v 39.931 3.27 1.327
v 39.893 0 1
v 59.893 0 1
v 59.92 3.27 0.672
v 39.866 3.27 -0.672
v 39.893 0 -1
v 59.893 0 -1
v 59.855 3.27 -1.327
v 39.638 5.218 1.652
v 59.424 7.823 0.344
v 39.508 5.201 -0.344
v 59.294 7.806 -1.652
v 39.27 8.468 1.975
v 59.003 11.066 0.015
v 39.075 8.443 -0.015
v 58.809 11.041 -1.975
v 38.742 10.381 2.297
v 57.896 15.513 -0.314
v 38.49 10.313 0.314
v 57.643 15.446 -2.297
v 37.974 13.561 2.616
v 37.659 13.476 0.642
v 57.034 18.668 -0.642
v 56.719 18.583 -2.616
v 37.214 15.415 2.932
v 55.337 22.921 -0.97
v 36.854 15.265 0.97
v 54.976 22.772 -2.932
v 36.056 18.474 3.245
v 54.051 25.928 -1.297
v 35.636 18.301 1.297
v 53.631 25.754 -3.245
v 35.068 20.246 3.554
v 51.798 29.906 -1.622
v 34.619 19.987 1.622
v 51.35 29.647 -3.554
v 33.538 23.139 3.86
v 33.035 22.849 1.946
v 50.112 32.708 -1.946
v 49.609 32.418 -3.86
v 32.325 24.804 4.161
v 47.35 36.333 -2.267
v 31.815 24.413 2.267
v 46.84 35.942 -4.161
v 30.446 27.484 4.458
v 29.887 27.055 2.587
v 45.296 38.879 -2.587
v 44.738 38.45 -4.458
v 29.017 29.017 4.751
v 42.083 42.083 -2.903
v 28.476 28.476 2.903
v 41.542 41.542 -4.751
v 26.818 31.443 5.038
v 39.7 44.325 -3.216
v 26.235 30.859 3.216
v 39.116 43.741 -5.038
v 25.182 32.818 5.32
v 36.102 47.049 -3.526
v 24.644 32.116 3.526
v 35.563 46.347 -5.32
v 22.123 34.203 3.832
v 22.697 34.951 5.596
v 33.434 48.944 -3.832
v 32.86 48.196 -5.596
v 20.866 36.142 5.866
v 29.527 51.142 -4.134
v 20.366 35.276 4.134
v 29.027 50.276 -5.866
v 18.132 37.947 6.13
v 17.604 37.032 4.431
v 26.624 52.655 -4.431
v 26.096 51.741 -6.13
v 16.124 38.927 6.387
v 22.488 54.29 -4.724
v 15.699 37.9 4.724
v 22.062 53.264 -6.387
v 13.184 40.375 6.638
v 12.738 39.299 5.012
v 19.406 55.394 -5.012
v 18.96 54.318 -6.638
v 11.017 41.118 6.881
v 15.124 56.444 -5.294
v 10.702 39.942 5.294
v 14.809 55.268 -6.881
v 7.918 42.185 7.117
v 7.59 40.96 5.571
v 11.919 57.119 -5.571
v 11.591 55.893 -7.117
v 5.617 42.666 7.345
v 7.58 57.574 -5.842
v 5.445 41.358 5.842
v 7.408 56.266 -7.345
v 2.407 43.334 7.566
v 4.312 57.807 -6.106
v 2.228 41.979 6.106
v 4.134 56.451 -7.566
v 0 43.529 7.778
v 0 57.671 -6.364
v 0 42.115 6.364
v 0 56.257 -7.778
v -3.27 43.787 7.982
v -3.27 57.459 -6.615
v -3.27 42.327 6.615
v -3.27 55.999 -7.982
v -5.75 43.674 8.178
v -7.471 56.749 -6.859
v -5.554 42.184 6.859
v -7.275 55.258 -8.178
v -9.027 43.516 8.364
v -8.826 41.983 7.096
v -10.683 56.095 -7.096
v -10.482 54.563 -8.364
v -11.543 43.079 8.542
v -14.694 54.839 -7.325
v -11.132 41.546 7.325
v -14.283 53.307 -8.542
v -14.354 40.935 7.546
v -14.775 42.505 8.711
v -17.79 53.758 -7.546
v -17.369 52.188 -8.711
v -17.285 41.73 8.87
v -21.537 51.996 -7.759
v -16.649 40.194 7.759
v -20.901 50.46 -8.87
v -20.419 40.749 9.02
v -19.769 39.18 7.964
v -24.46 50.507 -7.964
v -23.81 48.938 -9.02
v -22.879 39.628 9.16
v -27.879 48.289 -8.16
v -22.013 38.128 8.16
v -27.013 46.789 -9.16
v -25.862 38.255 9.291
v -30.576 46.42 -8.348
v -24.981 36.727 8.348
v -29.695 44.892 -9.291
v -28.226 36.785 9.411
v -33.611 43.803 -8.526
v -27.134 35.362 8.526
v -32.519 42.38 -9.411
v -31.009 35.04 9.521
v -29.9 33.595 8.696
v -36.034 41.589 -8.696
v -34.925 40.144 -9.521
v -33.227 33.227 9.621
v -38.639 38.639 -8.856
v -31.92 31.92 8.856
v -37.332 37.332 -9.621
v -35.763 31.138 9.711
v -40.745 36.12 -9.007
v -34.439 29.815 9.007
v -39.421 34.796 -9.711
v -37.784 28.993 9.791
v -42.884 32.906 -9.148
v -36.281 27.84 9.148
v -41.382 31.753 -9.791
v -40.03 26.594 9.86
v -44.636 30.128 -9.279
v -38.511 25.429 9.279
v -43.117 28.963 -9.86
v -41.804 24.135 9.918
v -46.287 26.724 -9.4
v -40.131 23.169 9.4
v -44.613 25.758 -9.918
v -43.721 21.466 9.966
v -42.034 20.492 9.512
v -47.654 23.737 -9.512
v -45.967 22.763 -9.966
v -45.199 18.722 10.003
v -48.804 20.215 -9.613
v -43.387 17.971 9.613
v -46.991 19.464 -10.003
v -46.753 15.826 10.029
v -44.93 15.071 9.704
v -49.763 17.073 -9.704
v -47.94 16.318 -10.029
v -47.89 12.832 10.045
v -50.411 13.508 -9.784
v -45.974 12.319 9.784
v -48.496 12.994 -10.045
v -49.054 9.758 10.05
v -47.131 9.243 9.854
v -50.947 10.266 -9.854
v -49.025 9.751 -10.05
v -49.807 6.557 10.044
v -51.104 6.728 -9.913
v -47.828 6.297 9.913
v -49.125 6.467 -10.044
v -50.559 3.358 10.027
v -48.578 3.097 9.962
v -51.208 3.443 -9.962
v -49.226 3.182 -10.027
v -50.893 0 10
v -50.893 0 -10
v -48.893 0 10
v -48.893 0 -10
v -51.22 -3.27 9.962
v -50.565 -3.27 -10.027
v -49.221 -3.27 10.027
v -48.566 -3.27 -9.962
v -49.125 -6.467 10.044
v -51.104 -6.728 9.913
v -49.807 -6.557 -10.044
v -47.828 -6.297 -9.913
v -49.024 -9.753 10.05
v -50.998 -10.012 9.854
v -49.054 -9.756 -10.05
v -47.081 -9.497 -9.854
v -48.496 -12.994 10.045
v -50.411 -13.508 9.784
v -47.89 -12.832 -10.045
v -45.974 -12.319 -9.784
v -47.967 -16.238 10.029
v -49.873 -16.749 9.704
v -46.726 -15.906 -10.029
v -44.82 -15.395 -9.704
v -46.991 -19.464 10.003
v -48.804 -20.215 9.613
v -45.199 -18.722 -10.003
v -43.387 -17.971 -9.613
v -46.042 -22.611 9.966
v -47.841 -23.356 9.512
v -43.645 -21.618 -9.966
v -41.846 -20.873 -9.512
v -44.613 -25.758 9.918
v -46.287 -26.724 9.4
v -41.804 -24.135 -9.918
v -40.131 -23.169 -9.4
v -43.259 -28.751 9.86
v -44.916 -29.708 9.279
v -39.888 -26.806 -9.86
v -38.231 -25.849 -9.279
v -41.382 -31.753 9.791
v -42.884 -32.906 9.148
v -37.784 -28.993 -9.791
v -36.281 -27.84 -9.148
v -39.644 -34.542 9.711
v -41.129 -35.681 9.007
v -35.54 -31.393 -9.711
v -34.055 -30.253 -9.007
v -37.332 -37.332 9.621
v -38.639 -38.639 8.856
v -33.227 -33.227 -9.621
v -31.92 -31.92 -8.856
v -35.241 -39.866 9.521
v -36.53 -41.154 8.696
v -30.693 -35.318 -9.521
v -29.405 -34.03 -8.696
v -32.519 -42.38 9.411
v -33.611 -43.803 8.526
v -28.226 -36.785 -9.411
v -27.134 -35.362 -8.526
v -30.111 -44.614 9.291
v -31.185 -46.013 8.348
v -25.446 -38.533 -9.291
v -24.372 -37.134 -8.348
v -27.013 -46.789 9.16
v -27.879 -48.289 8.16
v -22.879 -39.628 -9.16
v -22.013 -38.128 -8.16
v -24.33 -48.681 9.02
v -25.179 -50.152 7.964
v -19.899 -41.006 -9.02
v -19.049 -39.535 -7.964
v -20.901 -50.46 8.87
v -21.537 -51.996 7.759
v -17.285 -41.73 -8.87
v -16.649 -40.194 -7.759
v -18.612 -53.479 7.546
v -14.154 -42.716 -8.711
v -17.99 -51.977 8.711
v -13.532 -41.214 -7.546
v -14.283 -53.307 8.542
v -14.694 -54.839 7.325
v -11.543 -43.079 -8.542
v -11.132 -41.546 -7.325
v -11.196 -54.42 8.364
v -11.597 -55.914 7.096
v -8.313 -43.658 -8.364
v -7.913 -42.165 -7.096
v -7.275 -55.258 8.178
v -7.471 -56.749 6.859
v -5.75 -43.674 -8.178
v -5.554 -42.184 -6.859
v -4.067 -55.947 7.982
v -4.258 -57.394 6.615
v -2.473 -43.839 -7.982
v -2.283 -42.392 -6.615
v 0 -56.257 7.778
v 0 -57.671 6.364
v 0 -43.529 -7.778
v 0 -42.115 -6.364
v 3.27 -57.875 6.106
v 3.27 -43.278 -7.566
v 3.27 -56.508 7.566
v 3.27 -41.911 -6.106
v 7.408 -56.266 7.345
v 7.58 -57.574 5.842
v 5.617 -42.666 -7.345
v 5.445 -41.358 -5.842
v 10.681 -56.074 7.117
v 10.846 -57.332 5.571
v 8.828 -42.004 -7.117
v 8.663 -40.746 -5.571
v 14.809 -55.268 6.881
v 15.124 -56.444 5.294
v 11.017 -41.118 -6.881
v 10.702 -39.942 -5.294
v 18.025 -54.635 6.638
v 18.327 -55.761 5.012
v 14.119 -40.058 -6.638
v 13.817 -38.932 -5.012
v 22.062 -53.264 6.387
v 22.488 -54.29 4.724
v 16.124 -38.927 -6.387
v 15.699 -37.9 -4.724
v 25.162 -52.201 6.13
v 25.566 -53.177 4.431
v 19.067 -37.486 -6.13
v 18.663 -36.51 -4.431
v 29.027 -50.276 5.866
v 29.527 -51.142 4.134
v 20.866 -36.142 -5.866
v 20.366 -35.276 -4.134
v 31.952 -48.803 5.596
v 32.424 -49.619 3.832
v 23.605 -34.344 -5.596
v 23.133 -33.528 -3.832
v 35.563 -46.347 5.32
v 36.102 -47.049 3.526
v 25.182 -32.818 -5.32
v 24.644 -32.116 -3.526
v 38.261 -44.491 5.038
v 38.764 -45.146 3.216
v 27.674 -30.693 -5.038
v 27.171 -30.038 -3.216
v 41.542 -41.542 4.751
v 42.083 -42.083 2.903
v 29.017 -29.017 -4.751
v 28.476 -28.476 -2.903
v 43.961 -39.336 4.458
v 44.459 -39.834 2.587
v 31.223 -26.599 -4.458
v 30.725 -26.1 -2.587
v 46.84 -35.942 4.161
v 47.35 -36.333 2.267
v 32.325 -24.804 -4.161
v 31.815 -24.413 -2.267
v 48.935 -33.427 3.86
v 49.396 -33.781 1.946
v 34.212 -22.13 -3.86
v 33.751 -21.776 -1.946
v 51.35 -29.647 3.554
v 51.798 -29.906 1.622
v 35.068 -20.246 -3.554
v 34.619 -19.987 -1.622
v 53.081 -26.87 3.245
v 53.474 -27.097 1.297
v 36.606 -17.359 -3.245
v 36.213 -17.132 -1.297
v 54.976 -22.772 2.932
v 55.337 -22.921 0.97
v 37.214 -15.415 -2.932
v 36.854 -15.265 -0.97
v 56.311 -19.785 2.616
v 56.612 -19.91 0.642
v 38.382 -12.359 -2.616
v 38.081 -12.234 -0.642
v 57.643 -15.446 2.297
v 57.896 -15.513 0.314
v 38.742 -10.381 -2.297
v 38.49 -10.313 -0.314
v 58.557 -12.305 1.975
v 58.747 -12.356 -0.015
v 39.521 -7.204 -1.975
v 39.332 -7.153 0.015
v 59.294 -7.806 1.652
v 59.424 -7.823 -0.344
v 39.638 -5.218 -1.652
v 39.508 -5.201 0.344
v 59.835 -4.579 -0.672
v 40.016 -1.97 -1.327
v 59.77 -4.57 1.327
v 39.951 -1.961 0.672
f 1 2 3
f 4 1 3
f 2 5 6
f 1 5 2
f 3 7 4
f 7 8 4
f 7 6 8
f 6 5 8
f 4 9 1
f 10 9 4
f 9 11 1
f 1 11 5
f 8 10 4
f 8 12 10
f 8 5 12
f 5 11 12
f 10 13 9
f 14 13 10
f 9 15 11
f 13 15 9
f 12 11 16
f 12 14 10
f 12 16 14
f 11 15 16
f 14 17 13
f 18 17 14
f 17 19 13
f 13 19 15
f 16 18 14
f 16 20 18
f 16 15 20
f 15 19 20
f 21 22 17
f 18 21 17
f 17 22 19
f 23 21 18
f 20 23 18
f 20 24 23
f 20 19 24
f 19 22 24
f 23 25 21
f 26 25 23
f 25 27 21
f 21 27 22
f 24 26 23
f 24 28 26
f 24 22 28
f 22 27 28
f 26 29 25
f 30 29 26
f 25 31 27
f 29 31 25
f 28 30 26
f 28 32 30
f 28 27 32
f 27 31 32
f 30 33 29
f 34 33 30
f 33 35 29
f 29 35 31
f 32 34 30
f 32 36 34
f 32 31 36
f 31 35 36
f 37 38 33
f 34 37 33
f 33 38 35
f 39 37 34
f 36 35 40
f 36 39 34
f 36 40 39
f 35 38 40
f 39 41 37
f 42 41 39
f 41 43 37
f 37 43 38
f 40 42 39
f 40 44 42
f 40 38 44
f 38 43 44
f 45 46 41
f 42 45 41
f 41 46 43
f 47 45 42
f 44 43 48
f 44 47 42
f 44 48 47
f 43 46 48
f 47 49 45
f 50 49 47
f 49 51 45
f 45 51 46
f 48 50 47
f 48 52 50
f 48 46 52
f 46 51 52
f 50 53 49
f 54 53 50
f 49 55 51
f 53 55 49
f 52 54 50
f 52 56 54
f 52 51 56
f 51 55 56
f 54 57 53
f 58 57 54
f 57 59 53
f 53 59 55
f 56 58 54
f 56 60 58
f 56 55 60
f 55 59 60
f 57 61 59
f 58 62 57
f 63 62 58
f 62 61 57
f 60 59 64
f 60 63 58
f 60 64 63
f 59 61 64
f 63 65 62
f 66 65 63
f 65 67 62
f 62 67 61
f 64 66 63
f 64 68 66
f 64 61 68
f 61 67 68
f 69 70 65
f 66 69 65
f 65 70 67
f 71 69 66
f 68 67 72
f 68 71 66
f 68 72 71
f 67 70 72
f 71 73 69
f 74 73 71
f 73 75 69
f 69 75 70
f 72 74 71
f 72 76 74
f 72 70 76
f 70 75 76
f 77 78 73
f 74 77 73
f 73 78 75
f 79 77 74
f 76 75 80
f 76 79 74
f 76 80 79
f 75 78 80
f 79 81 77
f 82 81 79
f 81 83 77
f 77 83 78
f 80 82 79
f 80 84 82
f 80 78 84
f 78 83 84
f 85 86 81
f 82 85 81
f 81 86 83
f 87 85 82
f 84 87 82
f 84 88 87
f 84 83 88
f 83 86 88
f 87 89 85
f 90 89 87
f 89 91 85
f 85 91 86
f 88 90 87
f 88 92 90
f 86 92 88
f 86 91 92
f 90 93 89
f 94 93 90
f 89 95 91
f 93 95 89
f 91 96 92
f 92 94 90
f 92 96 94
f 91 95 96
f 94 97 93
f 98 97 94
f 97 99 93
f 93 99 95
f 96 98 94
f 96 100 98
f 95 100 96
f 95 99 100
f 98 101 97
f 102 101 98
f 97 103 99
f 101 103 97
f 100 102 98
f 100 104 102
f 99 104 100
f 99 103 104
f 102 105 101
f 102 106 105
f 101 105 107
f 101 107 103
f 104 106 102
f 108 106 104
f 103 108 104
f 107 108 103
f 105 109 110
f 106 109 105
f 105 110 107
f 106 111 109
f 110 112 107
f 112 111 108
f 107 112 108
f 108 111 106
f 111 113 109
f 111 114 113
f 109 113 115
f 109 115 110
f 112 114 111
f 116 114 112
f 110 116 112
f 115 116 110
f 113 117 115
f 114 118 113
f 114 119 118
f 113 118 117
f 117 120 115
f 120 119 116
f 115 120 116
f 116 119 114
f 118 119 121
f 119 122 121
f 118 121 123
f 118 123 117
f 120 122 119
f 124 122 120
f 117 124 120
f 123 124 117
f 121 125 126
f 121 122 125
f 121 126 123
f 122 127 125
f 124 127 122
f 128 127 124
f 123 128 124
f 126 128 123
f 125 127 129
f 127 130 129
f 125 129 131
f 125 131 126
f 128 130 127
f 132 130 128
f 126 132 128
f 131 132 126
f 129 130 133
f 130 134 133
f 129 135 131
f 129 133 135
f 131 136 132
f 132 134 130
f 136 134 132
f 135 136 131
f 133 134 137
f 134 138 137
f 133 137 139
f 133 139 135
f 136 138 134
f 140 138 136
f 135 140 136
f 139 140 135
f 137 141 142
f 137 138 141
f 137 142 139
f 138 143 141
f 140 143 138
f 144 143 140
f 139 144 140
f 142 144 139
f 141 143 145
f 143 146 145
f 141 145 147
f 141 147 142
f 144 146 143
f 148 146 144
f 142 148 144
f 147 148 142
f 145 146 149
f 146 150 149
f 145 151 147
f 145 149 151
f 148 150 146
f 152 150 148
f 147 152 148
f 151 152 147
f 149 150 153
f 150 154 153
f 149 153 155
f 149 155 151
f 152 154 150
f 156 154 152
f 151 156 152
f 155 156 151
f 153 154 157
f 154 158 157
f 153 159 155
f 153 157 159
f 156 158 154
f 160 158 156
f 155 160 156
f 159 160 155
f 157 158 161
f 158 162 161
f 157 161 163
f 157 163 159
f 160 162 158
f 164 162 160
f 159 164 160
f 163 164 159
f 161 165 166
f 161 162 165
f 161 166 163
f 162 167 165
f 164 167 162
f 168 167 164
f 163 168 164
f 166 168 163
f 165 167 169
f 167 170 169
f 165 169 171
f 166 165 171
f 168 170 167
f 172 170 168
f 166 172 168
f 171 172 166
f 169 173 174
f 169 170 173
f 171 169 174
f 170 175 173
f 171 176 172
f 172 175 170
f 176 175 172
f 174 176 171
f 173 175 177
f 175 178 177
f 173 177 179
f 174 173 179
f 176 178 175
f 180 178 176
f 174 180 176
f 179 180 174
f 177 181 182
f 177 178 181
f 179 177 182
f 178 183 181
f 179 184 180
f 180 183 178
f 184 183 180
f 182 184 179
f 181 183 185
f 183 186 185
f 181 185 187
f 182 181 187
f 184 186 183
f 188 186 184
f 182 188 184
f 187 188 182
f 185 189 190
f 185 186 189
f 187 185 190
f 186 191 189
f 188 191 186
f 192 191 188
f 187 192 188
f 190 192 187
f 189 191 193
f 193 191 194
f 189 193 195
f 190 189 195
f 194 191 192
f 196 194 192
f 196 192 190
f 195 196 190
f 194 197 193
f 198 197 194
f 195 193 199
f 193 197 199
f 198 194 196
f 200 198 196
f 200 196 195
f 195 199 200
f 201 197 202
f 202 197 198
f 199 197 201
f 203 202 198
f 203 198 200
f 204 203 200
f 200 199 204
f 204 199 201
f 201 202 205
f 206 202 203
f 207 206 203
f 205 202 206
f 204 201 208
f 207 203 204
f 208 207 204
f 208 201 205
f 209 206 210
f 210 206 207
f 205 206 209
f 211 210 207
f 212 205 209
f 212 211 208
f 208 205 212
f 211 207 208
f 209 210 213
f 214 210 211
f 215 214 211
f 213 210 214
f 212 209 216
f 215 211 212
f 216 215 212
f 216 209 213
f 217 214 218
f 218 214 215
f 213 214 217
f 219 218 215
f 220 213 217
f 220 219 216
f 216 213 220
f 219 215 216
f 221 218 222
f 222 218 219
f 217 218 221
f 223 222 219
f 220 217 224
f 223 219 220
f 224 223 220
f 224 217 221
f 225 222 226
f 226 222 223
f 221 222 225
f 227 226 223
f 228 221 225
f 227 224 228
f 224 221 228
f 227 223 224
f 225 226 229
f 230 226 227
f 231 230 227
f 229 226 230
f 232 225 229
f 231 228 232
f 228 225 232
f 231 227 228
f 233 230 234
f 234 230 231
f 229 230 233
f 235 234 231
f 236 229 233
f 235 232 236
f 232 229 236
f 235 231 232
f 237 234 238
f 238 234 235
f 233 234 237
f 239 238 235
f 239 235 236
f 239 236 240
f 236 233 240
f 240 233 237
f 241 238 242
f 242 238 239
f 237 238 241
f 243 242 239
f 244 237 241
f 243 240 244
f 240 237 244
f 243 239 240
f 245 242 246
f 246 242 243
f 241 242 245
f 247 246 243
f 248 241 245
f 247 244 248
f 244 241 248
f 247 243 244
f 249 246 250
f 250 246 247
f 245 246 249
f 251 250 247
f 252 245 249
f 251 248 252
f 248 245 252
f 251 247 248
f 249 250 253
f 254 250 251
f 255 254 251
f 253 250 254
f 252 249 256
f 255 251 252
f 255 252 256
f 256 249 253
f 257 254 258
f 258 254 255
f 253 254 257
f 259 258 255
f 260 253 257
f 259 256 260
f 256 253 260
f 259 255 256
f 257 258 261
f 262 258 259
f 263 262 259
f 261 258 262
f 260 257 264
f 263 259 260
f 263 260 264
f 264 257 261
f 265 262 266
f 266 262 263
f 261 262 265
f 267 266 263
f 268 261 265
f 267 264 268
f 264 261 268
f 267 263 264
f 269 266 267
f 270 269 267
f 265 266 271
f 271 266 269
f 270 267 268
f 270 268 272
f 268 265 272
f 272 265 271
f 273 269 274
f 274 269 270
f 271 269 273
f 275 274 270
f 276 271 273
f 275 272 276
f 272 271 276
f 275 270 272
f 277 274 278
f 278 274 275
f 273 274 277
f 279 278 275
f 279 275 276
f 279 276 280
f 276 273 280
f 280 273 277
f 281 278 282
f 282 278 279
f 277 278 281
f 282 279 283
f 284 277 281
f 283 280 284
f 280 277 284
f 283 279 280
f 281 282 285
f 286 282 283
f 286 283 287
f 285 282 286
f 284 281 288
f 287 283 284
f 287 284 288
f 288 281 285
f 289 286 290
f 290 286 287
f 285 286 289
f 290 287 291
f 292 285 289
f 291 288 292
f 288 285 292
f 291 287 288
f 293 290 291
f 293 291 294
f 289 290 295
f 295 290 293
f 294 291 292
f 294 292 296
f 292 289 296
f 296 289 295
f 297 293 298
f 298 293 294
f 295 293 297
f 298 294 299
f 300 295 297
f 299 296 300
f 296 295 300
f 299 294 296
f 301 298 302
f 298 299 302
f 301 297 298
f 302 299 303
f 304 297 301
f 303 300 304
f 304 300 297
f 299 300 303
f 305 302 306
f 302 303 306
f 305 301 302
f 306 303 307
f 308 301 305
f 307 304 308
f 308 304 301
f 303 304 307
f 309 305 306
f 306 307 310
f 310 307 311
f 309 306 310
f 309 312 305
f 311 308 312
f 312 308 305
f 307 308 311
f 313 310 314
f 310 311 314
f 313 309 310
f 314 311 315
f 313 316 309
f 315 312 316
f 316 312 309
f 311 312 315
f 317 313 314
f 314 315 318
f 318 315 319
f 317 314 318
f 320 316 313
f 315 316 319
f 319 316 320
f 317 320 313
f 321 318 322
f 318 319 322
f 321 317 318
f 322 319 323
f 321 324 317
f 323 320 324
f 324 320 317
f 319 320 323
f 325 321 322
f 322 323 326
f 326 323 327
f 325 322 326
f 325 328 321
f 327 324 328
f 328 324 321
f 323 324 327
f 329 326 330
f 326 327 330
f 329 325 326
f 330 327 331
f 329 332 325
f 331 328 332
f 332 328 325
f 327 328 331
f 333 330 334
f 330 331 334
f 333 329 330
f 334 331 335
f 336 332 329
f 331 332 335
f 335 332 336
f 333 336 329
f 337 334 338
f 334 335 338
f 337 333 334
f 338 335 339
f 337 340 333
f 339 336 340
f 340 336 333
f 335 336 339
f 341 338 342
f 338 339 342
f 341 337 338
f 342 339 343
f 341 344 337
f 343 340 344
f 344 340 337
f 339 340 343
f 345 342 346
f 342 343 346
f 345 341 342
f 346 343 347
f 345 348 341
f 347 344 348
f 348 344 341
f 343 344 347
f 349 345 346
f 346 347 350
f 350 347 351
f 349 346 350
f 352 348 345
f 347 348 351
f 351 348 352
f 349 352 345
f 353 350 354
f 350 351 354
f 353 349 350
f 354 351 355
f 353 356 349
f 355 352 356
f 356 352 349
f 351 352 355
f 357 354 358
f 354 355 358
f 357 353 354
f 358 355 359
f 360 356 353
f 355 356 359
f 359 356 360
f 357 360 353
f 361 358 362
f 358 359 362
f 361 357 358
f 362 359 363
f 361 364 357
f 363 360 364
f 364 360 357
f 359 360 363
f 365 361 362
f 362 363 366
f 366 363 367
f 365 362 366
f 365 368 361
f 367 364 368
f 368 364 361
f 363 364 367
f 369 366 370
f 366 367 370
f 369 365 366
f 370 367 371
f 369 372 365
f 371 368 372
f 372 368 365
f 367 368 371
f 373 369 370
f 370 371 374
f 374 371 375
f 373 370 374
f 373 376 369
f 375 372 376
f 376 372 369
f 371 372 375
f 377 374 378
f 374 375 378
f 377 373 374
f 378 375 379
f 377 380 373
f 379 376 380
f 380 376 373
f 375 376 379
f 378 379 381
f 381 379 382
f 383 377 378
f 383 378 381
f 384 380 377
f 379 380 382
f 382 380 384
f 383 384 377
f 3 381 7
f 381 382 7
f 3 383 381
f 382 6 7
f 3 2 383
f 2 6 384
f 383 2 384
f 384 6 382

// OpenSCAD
band_width = 20;
band_thickness = 2;    
circle_radius = 50;    
circle_frags = 48;
half_circles_twisted = 1;

/**
* rotate_p.scad
*
* Rotates a point 'a' degrees around an arbitrary axis. 
* The rotation is applied in the following order: x, y, z. 
* 
* @copyright Justin Lin, 2017
* @license https://opensource.org/licenses/lgpl-3.0.html
*
* @see https://openhome.cc/eGossip/OpenSCAD/lib-rotate_p.html
*
**/ 

function _rotx(pt, a) = 
    let(cosa = cos(a), sina = sin(a))
    [
        pt[0], 
        pt[1] * cosa - pt[2] * sina,
        pt[1] * sina + pt[2] * cosa
    ];

function _roty(pt, a) = 
    let(cosa = cos(a), sina = sin(a))
    [
        pt[0] * cosa + pt[2] * sina, 
        pt[1],
        -pt[0] * sina + pt[2] * cosa, 
    ];

function _rotz(pt, a) = 
    let(cosa = cos(a), sina = sin(a))
    [
        pt[0] * cosa - pt[1] * sina,
        pt[0] * sina + pt[1] * cosa,
        pt[2]
    ];

function _rotate_p_3d(point, a) =
    _rotz(_roty(_rotx(point, a[0]), a[1]), a[2]);

function _to2d(p) = [p[0], p[1]];

function to_avect(a) =
     len(a) == 3 ? a : (
         len(a) == 2 ? [a[0], a[1], 0] : (
             len(a) == 1 ? [a[0], 0, 0] : [0, 0, a]
         ) 
     );

function rotate_p(point, a) =
    let(angle = to_avect(a))
    len(point) == 3 ? 
        _rotate_p_3d(point, angle) :
        _to2d(
            _rotate_p_3d([point[0], point[1], 0], angle)
        );

/**
* polysections.scad
*
* Crosscutting a tube-like shape at different points gets several cross-sections.
* This module can operate reversely. It uses cross-sections to construct a tube-like shape.
* 
* @copyright Justin Lin, 2017
* @license https://opensource.org/licenses/lgpl-3.0.html
*
* @see https://openhome.cc/eGossip/OpenSCAD/lib-polysections.html
*
**/

module polysections(sections, triangles = "RADIAL") {
    module tri_sections(tri1, tri2) {
        polyhedron(
            points = concat(tri1, tri2),
            faces = [
                [0, 1, 2], 
                [3, 4, 5], 
                [0, 1, 4], [1, 2, 5], [2, 0, 3], 
                [0, 3, 4], [1, 4, 5], [2, 5, 3]
            ]
        );  
    }
    
    function flat(vector, i = 0) =
        i == len(vector) ? [] :
        concat(vector[i], flat(vector, i + 1));    
    
    leng_section = len(sections[0]);
    
    function radial_tris() = [
        for(i = [1:leng_section - 2]) [0, i, i + 1]
    ];
        
    function hollow_tris() = 
        let(
            inner_i_begin = leng_section / 2,
            pair_idxes = [for(i = [0:inner_i_begin - 1])
                let(n = inner_i_begin + i + 1)
                [
                    [i, inner_i_begin + i, n % inner_i_begin + inner_i_begin], 
                    [i, i + 1, n % leng_section]
                ]
                
            ]
           
        ) flat(pair_idxes); 

    function tris() = triangles == "RADIAL" ? radial_tris() : 
        (triangles == "HOLLOW" ? hollow_tris() : triangles);
    
    module two_sections(section1, section2) {
        for(idx = tris()) {
            // hull is for preventing from WARNING: Object may not be a valid 2-manifold
            hull() tri_sections(
                [
                    section1[idx[0]], 
                    section1[idx[1]], 
                    section1[idx[2]]
                ], 
                [
                    section2[idx[0]], 
                    section2[idx[1]], 
                    section2[idx[2]]
                ]
            );
        }
    }
    
    for(i = [0:len(sections) - 2]) {
         two_sections(
             sections[i], 
             sections[i + 1]
         );
    }
}

/**
* path_extrude.scad
*
* It extrudes a 2D shape along a path. 
* This module is suitable for a path created by a continuous function.
* It depends on the rotate_p function and the polysections module. 
* Remember to include "rotate_p.scad" and "polysections.scad".
*
* @copyright Justin Lin, 2017
* @license https://opensource.org/licenses/lgpl-3.0.html
*
* @see https://openhome.cc/eGossip/OpenSCAD/lib-path_extrude.html
*
**/

module path_extrude(shape_pts, path_pts, triangles = "RADIAL", twist = 0, scale = 1.0, closed = false) {

    s_pts = to3d(shape_pts);
    pth_pts = to3d(path_pts);

    len_path_pts = len(pth_pts);    
    len_path_pts_minus_one = len_path_pts - 1;     

    scale_step_vt = len(scale) == 2 ? 
        [(scale[0] - 1) / len_path_pts_minus_one, (scale[1] - 1) / len_path_pts_minus_one] :
        [(scale - 1) / len_path_pts_minus_one, (scale - 1) / len_path_pts_minus_one];

    scale_step_x = scale_step_vt[0];
    scale_step_y = scale_step_vt[1];
    twist_step = twist / len_path_pts_minus_one;

    function to3d(pts) = 
        len(pts[0]) == 3 ? pts : [for(p = pts) [p[0], p[1], 0]];

    function first_section() = 
        let(
            p1 = pth_pts[0],
            p2 = pth_pts[1],
            dx = p2[0] - p1[0],
            dy = p2[1] - p1[1],
            dz = p2[2] - p1[2],
            ay = 90 - atan2(dz, sqrt(pow(dx, 2) + pow(dy, 2))),
            az = atan2(dy, dx)
        )
        [
            for(p = s_pts) 
                rotate_p(p, [0, ay, az]) + p1
        ];

    function section(p1, p2, i) = 
        let(
            dx = p2[0] - p1[0],
            dy = p2[1] - p1[1],
            dz = p2[2] - p1[2],
            length = sqrt(pow(dx, 2) + pow(dy, 2) + pow(dz, 2)),
            ay = 90 - atan2(dz, sqrt(pow(dx, 2) + pow(dy, 2))),
            az = atan2(dy, dx)
        )
        [
            for(p = s_pts) 
                let(scaled_p = [p[0] * (1 + scale_step_x * i), p[1] * (1 + scale_step_y * i), p[2]])
                rotate_p(
                     rotate_p(scaled_p, twist_step * i) + [0, 0, length], 
                     [0, ay, az]
                ) + p1
        ];
    
    function path_extrude_inner(index) =
       index == len_path_pts ? [] :
           concat(
               [section(pth_pts[index - 1], pth_pts[index],  index)],
               path_extrude_inner(index + 1)
           );

    if(closed && pth_pts[0] == pth_pts[len_path_pts_minus_one]) {
        // round-robin
        sections = path_extrude_inner(1);
        polysections(
            concat(sections, [sections[0]]),
            triangles = triangles
        );   
    } else {
        polysections(
            concat([first_section()], path_extrude_inner(1)),
            triangles = triangles
        ); 
    }
}

module twisted_band(width, thickness, circle_radius, circle_frags, half_circles_twisted) {
    function flatten(vt, i = 0) = 
        i == len(vt) ? [] :
            concat(vt[i], flatten(vt, i + 1));

    function circle_pair_pts(circle_radius, circle_frags) = 
        let(
            a = 360 / circle_frags,
            half_a = a / 2,
            x = circle_radius * cos(half_a),
            y = circle_radius * sin(half_a),
            tri_pts = [[x, 0, 0], [x, y, 0]]
        )
        [
            for(i = [0:circle_frags - 1]) 
                [rotate_p(tri_pts[0], i * a), rotate_p(tri_pts[1], i * a)]
        ];
        
    function circle_path_for_mobius(circle_radius, circle_frags) = 
        concat(
            flatten(circle_pair_pts(circle_radius, circle_frags)), 
            [[circle_radius * cos(180 / circle_frags), 0, 0]]
        );
        
    half_width = width / 2;  
    half_thickness = thickness / 2;  
        
    shape_pts = [
        [-half_thickness, -half_width],
        [-half_thickness, half_width],
        [half_thickness, half_width],
        [half_thickness, -half_width]
    ];
    
    path_pts = circle_path_for_mobius(circle_radius, circle_frags);

    path_extrude(shape_pts, path_pts, twist = 180 * half_circles_twisted);
}
     
twisted_band(band_width, band_thickness, circle_radius, circle_frags, half_circles_twisted);
